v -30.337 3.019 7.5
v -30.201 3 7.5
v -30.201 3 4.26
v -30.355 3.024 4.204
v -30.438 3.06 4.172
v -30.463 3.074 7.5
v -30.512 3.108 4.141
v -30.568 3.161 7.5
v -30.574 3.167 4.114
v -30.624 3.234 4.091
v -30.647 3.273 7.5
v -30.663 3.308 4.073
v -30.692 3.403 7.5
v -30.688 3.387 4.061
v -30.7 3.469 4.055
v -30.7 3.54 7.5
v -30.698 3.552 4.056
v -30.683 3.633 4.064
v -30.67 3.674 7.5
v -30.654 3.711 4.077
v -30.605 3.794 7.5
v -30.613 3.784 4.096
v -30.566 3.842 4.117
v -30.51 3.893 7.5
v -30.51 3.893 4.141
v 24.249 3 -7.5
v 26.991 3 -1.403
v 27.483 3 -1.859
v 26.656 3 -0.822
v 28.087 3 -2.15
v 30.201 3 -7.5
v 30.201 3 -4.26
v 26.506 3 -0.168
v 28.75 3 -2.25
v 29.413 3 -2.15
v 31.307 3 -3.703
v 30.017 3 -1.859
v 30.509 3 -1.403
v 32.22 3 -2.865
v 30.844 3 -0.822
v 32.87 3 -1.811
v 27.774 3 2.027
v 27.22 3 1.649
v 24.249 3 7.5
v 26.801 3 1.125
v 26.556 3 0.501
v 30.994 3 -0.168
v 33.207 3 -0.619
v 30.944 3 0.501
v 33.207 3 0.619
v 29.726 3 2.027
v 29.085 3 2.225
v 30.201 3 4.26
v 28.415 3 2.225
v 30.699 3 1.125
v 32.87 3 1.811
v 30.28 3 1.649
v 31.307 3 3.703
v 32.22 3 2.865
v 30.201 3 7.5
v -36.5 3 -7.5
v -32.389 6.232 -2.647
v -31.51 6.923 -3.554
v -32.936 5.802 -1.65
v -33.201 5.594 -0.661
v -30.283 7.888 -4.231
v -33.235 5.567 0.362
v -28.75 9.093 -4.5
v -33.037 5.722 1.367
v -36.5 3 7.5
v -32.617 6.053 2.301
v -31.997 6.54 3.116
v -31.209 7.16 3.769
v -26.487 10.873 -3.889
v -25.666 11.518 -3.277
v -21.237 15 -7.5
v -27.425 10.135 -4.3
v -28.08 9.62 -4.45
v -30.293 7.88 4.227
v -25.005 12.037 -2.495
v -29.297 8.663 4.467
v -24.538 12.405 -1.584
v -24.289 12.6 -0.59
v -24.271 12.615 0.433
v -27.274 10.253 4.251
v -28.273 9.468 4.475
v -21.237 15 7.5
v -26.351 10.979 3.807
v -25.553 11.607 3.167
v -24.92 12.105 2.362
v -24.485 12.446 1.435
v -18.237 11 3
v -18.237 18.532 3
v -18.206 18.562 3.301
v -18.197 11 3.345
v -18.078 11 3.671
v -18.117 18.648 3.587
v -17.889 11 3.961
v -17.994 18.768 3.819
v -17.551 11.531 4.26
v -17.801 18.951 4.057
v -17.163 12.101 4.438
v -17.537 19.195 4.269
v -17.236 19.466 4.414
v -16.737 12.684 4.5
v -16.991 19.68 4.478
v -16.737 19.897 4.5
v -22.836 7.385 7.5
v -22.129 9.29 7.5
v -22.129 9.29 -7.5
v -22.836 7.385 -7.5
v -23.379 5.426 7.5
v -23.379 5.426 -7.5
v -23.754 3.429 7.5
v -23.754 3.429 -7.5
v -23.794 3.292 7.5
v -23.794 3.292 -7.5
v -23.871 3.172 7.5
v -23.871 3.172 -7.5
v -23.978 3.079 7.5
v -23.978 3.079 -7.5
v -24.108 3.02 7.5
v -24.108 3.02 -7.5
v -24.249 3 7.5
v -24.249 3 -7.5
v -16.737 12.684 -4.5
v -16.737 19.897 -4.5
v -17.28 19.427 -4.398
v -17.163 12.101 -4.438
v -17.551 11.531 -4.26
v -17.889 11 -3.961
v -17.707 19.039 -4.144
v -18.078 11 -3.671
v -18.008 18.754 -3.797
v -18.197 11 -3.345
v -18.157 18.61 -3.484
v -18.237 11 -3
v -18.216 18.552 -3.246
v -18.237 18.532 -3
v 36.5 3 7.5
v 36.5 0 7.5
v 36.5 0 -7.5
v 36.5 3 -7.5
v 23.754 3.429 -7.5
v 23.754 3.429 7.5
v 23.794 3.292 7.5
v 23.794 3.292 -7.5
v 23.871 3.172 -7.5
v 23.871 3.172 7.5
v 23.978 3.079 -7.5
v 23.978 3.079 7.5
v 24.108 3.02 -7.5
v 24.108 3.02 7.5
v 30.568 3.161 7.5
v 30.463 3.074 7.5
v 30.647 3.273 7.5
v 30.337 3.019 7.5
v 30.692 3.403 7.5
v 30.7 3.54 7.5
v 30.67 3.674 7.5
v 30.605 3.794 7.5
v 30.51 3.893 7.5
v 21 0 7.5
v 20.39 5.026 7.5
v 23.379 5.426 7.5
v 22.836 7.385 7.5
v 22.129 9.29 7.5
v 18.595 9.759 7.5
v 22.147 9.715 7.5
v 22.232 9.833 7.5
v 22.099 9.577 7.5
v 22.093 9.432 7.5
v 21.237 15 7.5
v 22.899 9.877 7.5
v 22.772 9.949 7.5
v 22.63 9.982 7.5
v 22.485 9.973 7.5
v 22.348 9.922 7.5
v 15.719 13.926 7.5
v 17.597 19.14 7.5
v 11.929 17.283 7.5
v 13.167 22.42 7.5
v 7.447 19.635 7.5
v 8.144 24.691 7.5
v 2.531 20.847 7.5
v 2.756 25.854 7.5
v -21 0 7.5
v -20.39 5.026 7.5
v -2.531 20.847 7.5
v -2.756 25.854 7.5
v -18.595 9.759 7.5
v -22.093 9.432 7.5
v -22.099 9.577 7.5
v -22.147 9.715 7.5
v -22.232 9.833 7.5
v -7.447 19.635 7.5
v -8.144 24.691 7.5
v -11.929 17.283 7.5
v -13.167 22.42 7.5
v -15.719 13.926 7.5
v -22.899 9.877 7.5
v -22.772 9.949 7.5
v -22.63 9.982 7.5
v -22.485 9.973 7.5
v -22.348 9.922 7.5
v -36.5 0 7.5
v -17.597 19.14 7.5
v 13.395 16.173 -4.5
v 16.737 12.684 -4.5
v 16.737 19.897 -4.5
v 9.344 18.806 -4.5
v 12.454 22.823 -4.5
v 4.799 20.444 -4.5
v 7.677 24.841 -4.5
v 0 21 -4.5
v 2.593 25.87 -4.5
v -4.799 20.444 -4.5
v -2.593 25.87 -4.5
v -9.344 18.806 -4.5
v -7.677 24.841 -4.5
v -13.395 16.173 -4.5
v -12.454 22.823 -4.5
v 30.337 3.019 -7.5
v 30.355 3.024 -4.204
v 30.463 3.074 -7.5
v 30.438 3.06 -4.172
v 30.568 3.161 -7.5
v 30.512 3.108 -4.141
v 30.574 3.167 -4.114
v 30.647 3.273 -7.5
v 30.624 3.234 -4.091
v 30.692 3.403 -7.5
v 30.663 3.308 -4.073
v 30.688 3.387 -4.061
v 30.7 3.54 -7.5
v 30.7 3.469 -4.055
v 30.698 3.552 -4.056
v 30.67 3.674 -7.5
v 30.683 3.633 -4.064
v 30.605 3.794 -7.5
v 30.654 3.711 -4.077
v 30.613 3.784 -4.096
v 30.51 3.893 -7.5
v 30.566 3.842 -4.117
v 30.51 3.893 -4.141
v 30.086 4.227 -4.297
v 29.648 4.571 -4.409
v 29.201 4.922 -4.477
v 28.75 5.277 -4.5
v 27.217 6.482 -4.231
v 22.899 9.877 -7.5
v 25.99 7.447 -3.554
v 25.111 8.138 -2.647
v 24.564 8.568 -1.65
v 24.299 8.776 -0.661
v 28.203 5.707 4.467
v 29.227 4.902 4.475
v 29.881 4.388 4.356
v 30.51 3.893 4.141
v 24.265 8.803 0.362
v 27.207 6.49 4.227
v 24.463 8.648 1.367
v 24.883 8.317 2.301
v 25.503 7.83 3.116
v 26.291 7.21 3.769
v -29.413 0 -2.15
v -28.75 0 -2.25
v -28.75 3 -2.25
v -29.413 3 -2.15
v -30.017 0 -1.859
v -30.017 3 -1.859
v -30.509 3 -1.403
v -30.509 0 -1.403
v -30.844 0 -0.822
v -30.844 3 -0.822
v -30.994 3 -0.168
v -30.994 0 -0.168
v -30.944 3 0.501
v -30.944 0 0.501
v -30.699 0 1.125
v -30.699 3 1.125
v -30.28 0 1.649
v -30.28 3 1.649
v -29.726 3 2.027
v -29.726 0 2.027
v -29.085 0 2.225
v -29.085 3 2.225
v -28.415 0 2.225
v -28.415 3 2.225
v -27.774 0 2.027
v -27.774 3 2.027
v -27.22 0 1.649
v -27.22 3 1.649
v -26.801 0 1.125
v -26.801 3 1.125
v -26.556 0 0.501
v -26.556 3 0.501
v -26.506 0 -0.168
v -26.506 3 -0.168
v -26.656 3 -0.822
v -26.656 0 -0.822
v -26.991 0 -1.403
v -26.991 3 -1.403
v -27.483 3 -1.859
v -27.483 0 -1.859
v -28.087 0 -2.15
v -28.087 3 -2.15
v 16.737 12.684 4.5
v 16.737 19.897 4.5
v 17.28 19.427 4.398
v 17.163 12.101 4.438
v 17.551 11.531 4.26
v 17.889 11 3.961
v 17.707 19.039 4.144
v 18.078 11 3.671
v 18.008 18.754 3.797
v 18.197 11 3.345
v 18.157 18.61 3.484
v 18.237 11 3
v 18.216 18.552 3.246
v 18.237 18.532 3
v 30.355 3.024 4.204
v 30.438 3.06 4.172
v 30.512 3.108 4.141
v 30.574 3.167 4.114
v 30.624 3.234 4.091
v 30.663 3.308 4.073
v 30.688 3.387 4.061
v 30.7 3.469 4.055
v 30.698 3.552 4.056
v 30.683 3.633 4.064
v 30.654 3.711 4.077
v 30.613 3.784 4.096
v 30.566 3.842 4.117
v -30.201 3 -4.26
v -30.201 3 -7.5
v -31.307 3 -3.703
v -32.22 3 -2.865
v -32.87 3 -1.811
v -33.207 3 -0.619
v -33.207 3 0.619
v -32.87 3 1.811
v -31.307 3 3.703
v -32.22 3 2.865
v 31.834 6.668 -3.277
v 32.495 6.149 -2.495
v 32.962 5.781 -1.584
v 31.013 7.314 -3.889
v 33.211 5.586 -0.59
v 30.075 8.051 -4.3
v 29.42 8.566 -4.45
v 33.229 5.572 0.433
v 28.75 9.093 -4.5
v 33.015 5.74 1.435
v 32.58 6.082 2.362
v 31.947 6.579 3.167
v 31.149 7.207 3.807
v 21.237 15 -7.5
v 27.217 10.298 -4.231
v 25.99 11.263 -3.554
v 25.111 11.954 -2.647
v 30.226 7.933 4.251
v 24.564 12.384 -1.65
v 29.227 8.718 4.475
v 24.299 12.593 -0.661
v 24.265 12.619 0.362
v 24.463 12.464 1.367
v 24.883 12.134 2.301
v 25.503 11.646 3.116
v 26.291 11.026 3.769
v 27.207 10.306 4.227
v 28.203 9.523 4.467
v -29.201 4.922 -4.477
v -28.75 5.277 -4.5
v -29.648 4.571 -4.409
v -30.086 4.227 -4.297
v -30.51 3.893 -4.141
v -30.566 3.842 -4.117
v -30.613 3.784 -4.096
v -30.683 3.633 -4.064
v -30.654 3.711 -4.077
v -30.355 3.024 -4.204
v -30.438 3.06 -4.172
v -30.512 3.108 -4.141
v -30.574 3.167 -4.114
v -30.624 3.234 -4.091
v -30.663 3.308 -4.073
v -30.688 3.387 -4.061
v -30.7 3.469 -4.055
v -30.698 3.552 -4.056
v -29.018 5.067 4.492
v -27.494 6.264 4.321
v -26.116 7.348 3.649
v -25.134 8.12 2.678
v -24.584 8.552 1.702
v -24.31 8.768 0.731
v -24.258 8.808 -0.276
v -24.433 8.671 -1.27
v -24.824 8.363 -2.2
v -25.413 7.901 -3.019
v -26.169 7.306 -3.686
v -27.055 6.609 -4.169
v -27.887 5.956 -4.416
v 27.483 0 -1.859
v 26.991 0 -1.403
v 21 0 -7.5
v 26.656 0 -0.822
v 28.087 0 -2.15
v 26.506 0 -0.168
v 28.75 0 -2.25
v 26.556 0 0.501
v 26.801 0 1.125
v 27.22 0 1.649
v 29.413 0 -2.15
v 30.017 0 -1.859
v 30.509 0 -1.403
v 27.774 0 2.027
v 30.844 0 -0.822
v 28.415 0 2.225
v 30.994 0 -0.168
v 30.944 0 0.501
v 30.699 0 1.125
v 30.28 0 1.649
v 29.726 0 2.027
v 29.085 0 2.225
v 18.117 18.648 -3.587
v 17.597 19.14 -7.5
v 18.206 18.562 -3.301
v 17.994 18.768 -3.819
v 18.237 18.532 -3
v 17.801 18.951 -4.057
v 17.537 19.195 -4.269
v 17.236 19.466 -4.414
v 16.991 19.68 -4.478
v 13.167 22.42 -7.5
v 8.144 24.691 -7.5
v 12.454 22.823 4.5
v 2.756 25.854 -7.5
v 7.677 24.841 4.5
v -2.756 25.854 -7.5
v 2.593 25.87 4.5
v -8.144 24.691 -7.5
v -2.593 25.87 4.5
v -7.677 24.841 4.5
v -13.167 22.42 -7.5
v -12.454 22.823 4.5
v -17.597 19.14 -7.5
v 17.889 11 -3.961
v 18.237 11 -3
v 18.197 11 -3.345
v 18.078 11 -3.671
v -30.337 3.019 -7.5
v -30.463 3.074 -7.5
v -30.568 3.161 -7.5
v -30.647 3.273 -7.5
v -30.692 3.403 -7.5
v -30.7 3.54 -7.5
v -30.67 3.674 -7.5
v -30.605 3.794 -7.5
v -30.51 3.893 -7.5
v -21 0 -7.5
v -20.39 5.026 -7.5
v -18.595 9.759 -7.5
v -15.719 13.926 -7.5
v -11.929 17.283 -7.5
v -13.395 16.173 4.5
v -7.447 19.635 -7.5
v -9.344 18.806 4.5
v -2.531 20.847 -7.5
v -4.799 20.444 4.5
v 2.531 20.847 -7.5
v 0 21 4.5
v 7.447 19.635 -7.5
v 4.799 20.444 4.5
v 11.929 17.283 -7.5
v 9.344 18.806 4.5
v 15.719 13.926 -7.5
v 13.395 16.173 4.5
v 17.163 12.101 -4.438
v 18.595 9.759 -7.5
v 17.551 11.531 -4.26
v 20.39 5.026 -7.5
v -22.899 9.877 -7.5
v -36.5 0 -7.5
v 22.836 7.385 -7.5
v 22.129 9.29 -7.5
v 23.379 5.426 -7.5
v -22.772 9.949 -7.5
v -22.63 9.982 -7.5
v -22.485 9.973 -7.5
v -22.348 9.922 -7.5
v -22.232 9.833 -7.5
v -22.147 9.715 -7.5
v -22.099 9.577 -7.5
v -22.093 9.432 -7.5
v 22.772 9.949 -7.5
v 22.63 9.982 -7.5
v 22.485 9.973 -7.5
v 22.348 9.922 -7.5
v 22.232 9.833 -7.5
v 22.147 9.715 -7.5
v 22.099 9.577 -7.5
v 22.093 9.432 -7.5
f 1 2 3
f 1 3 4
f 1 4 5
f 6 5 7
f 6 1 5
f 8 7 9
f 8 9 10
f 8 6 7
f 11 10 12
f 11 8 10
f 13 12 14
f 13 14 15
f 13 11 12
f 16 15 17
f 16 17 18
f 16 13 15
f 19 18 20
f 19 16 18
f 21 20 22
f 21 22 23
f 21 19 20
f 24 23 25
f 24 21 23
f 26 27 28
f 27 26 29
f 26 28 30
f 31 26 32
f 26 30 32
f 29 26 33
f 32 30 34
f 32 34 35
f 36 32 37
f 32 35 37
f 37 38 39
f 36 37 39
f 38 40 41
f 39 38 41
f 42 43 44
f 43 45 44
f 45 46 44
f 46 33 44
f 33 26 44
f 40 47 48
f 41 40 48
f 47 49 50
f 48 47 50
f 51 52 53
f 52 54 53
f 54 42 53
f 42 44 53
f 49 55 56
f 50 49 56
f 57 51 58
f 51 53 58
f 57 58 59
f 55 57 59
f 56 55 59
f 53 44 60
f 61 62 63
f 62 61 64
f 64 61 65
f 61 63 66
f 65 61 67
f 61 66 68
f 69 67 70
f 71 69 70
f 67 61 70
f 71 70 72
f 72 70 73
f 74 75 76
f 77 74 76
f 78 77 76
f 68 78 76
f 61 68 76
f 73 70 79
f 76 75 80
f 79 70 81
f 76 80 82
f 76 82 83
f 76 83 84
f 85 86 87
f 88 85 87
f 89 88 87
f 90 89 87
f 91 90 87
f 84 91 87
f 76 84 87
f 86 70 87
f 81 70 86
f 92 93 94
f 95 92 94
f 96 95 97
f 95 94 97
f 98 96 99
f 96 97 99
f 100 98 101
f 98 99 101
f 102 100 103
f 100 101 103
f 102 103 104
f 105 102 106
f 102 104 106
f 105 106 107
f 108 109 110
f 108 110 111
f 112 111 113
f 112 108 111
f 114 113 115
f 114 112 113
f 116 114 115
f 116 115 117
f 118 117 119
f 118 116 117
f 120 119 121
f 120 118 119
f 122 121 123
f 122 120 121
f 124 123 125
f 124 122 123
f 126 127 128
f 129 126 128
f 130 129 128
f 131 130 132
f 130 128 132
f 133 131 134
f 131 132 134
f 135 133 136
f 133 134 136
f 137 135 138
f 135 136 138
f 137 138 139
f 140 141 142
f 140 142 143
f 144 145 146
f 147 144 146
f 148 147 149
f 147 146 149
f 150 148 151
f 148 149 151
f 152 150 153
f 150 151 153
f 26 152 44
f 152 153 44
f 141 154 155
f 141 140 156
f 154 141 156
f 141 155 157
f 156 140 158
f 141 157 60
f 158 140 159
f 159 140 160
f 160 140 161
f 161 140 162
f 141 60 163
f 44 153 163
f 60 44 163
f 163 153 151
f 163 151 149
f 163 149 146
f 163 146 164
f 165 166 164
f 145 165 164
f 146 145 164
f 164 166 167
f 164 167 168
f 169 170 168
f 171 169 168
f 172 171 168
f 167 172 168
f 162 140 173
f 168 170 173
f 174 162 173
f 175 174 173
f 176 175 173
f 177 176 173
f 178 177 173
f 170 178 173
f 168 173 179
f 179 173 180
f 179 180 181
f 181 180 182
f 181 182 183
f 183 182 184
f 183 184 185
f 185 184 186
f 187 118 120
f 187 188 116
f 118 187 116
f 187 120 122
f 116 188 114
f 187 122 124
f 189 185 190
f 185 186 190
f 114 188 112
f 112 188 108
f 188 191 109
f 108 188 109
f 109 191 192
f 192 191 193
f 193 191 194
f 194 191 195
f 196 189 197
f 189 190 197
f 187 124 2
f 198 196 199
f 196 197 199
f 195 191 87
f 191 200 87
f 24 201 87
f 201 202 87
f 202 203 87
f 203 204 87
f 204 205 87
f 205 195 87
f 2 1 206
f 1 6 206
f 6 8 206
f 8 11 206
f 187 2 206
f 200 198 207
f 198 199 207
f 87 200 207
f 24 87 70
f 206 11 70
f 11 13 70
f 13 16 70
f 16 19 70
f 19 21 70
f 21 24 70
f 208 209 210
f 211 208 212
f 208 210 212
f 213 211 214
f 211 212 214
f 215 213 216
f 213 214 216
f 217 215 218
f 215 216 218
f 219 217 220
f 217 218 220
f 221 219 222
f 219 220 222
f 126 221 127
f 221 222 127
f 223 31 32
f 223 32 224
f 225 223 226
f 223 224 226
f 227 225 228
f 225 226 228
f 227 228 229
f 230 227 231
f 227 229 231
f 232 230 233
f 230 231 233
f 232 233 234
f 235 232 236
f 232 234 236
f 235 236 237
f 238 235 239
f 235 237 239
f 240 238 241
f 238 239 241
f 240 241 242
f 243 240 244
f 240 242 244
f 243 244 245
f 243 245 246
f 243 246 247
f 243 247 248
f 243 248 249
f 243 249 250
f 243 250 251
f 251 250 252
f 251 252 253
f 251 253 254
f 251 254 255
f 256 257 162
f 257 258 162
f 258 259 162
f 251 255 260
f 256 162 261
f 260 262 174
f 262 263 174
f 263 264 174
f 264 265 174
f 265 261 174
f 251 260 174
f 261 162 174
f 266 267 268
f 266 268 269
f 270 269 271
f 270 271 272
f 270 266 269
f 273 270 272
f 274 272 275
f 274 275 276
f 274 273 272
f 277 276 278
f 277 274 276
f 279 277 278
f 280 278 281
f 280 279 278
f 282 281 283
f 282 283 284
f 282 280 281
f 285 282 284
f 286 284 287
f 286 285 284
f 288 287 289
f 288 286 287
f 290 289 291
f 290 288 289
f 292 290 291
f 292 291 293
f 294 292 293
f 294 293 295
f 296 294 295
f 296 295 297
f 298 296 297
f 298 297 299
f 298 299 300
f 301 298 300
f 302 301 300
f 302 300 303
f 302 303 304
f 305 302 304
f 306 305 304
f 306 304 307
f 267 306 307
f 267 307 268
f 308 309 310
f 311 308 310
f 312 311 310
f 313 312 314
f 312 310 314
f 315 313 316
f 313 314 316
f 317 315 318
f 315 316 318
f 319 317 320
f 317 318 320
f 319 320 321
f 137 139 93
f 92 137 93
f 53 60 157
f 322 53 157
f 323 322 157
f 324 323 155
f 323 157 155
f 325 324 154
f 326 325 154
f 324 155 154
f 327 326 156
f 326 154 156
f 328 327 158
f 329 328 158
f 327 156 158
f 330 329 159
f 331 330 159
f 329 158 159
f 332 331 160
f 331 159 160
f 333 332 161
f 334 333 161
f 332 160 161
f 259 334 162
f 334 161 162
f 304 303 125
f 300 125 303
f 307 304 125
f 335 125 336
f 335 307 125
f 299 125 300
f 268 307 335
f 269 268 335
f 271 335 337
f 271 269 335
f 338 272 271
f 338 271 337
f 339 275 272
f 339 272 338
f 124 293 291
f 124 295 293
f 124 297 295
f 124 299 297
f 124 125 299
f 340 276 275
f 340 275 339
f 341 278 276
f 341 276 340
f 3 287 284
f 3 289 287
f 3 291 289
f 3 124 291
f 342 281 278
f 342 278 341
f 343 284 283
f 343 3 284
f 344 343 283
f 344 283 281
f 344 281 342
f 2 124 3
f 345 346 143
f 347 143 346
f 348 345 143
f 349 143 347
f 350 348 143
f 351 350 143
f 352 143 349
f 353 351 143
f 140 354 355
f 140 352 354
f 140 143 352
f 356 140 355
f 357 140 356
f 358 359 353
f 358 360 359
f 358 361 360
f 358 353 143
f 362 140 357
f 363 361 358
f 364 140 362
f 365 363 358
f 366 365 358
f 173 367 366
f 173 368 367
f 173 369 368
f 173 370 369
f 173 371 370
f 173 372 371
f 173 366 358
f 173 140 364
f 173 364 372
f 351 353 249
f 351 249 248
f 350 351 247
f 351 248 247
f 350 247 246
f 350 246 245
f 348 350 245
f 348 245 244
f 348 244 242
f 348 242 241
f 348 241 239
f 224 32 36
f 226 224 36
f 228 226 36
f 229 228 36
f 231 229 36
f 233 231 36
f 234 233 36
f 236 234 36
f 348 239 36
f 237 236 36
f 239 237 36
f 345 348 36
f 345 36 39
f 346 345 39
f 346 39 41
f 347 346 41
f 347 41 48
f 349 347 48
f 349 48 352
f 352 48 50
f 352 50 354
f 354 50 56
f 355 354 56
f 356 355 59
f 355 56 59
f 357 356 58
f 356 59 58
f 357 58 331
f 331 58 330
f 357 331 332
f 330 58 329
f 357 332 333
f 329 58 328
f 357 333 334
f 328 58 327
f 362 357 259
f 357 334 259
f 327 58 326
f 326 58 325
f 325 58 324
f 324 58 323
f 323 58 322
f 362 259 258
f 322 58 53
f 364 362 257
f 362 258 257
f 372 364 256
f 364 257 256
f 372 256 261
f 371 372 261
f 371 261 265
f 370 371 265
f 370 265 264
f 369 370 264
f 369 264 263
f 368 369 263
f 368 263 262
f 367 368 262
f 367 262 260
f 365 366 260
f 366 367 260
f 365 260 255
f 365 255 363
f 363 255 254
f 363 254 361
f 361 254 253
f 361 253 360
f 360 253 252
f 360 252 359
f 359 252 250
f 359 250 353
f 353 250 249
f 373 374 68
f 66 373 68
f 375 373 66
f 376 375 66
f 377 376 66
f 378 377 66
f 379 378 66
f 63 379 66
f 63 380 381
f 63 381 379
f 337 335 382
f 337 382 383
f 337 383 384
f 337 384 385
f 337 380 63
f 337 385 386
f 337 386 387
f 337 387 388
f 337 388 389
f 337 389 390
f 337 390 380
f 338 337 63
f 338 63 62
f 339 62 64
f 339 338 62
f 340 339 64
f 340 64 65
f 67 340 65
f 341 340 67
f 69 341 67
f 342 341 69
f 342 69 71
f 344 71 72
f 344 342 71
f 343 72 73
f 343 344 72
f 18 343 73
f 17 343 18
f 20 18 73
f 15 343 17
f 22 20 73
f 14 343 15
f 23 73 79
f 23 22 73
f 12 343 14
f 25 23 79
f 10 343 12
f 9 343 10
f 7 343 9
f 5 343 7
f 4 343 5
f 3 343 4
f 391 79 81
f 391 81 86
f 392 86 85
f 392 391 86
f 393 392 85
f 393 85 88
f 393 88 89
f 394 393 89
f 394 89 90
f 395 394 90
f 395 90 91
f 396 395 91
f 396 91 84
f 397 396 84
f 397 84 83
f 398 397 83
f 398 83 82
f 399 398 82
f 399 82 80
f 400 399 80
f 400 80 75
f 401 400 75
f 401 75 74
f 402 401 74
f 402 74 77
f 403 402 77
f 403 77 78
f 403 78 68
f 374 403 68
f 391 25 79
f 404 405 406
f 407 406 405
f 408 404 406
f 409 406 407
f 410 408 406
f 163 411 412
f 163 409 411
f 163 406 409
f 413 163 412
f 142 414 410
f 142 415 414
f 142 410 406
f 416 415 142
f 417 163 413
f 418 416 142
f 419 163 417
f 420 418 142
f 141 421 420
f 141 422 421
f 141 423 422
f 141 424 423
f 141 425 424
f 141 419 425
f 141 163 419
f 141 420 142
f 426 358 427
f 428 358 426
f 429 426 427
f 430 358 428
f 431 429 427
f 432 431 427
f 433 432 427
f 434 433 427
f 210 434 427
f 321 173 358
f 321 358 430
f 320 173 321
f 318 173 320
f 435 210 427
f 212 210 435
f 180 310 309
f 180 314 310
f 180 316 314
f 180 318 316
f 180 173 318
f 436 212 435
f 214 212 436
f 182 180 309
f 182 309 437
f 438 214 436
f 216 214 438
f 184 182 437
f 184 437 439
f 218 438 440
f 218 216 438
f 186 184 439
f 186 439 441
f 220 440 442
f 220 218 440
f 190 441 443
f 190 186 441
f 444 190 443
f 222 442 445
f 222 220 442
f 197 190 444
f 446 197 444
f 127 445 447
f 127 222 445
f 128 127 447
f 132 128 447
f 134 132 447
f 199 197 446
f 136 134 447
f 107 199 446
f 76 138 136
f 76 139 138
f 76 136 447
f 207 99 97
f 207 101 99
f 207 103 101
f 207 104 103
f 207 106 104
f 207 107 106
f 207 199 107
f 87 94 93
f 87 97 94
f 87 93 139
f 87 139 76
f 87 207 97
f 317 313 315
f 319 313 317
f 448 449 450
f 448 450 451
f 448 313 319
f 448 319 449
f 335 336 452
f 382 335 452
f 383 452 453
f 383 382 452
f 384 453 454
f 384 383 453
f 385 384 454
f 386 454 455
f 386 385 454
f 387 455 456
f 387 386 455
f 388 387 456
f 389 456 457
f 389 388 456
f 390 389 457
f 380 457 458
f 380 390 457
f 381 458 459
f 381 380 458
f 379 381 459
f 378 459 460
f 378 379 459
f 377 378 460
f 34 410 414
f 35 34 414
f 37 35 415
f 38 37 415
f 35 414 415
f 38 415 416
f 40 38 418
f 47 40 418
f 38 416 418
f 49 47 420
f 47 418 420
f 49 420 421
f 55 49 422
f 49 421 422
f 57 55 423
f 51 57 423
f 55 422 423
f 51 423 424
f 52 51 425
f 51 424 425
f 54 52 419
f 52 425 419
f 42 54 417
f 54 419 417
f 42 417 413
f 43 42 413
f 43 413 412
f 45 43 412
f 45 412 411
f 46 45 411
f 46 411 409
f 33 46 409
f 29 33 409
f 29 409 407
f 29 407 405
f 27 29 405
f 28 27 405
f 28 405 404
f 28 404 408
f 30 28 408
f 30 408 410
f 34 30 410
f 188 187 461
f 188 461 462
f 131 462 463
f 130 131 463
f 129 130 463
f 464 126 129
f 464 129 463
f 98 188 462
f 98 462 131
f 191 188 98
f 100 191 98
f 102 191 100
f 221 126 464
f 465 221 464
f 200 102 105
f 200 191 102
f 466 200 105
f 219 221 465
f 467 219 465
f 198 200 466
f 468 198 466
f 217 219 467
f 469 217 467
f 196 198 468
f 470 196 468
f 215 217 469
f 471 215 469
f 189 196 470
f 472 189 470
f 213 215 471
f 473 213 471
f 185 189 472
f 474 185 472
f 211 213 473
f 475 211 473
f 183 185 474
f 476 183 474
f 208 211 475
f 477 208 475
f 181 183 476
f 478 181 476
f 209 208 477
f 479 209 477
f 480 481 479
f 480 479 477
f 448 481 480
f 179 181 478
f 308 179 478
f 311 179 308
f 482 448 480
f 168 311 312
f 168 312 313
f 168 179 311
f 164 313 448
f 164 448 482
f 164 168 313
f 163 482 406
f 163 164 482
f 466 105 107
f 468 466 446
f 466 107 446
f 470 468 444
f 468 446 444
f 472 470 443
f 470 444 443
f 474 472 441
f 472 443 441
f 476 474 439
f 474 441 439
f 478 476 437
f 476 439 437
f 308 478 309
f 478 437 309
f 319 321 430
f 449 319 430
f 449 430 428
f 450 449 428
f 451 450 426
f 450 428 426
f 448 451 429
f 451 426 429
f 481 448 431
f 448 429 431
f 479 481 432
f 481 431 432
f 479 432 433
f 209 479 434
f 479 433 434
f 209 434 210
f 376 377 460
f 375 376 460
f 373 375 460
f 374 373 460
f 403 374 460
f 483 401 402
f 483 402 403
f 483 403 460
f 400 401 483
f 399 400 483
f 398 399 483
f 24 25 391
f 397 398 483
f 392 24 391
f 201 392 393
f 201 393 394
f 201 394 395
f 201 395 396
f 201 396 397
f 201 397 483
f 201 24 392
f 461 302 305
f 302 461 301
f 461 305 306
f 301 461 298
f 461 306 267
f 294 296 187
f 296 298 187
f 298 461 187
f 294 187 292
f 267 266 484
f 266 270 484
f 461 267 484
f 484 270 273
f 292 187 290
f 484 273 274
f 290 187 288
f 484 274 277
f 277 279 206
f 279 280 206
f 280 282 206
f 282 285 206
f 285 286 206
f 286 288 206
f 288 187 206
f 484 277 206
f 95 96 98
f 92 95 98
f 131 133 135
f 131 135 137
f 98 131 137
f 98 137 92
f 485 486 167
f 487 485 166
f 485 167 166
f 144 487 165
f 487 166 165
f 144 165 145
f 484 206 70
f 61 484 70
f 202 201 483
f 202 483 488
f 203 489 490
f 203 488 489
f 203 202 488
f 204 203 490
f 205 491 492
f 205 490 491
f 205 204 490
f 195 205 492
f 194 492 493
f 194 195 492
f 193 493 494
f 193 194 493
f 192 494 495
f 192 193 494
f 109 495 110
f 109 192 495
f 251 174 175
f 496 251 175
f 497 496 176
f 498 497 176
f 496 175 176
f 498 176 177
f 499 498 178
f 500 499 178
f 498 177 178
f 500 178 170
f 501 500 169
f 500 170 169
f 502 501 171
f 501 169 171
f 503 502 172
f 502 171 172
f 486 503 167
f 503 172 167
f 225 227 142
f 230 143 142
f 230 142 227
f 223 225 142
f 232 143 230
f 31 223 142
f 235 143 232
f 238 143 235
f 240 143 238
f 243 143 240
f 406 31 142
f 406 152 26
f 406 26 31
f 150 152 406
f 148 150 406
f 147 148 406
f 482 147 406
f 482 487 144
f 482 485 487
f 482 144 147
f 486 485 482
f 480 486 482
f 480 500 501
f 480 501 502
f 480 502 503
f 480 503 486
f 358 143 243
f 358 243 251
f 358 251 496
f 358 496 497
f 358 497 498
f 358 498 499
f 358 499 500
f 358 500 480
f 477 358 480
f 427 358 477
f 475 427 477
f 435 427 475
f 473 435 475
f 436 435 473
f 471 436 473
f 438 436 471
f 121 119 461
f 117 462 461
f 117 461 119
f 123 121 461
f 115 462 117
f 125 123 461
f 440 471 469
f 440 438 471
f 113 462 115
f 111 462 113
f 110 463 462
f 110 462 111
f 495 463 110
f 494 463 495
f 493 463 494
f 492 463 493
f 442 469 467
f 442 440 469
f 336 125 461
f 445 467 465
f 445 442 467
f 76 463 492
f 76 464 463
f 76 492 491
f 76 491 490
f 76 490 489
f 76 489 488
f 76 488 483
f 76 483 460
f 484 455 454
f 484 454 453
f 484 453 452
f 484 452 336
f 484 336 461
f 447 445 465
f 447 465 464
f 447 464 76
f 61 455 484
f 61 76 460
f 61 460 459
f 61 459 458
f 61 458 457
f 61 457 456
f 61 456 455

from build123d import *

# Parameters (mm, degrees)
SALIENTE_EXTRUIR1_DEPTH = 7.5
SALIENTE_EXTRUIR2_DEPTH = 7.5
CROQUIS3_R              = 2.25
CORTAR_EXTRUIR1_DEPTH   = 46.436769251
CROQUIS4_R              = 4.5
CORTAR_EXTRUIR2_DEPTH   = 44.789268092
CORTAR_EXTRUIR3_DEPTH   = 48.257274572
CORTAR_EXTRUIR4_DEPTH   = 15


with BuildPart() as part:
    # Croquis1 → Saliente-Extruir1 (new, symmetric)
    with BuildSketch(Plane.XY):
        with BuildLine():
            Line((-26, 0), (-21, 0))
            ThreePointArc((-21, 0), (0, 21), (21, 0))
            Line((21, 0), (26, 0))
            ThreePointArc((26, 0), (0, 26), (-26, 0))
        make_face()
    extrude(amount=SALIENTE_EXTRUIR1_DEPTH, both=True)

    # Croquis2 → Saliente-Extruir2 (add, symmetric)
    with BuildSketch(Plane.XY):
        with BuildLine():
            Line((26, 0), (36.5, 0))
            Line((36.5, 0), (36.5, 3))
            Line((36.5, 3), (21.236760582, 15))
            ThreePointArc((21.236760582, 15), (24.78059498, 7.869060455), (26, 0))
        make_face()
    saliente_extruir2 = extrude(amount=SALIENTE_EXTRUIR2_DEPTH, both=True)

    # Croquis3 → Cortar-Extruir1 (cut, through all)
    with BuildSketch(Plane.XZ):
        with Locations(Location((28.75, 0, 0), (0, 0, 270))):
            Circle(CROQUIS3_R)
    cortar_extruir1 = extrude(amount=-CORTAR_EXTRUIR1_DEPTH, mode=Mode.SUBTRACT)

    # Croquis4 → Cortar-Extruir2 (cut, through all)
    with BuildSketch(Plane(origin=(0, 3, 0), x_dir=(-1, 0, 0), z_dir=(0, -1, 0))):
        with Locations(Location((-28.75, 0, 0), (0, 0, 90))):
            Circle(CROQUIS4_R)
    cortar_extruir2 = extrude(amount=-CORTAR_EXTRUIR2_DEPTH, mode=Mode.SUBTRACT)

    # Simetría1: Saliente-Extruir2 across plane
    add(saliente_extruir2.mirror(Plane(origin=(0, 0, 0), x_dir=(0, 0, 1), z_dir=(1, 0, 0))))

    # Croquis6 → Cortar-Extruir3 (cut, through all)
    with BuildSketch(Plane.XY.offset(7.5)):
        with BuildLine():
            Line((30.510170652, 3.893065888), (22.898948379, 9.877029369))
            ThreePointArc((22.898948379, 9.877029369), (22.28692582, 9.881701061), (22.128900164, 9.290413206))
            ThreePointArc((22.128900164, 9.290413206), (23.12783497, 6.411181608), (23.753839647, 3.428571429))
            ThreePointArc((23.753839647, 3.428571429), (23.921384471, 3.122035527), (24.248711306, 3))
            Line((24.248711306, 3), (30.201141191, 3))
            ThreePointArc((30.201141191, 3), (30.673652007, 3.336496092), (30.510170652, 3.893065888))
        make_face()
    cortar_extruir3 = extrude(amount=-CORTAR_EXTRUIR3_DEPTH, mode=Mode.SUBTRACT)

    # Croquis8 → Cortar-Extruir4 (cut)
    with BuildSketch(Plane(origin=(0, 26, 0), x_dir=(1, 0, 0), z_dir=(0, 1, 0))):
        with BuildLine():
            Line((-16.736760582, -4.5), (16.736760582, -4.5))
            ThreePointArc((16.736760582, -4.5), (17.797420753, -4.060660172), (18.236760582, -3))
            Line((18.236760582, -3), (18.236760582, 3))
            ThreePointArc((18.236760582, 3), (17.797420753, 4.060660172), (16.736760582, 4.5))
            Line((16.736760582, 4.5), (-16.736760582, 4.5))
            ThreePointArc((-16.736760582, 4.5), (-17.797420753, 4.060660172), (-18.236760582, 3))
            Line((-18.236760582, 3), (-18.236760582, -3))
            ThreePointArc((-18.236760582, -3), (-17.797420753, -4.060660172), (-16.736760582, -4.5))
        make_face()
    extrude(amount=-CORTAR_EXTRUIR4_DEPTH, mode=Mode.SUBTRACT)

    # Simetría2: Cortar-Extruir1, Cortar-Extruir2, Cortar-Extruir3 across plane
    add(cortar_extruir1.mirror(Plane(origin=(0, 0, 0), x_dir=(0, 0, 1), z_dir=(1, 0, 0))), mode=Mode.SUBTRACT)
    add(cortar_extruir2.mirror(Plane(origin=(0, 0, 0), x_dir=(0, 0, 1), z_dir=(1, 0, 0))), mode=Mode.SUBTRACT)
    add(cortar_extruir3.mirror(Plane(origin=(0, 0, 0), x_dir=(0, 0, 1), z_dir=(1, 0, 0))), mode=Mode.SUBTRACT)


solid = part.part
